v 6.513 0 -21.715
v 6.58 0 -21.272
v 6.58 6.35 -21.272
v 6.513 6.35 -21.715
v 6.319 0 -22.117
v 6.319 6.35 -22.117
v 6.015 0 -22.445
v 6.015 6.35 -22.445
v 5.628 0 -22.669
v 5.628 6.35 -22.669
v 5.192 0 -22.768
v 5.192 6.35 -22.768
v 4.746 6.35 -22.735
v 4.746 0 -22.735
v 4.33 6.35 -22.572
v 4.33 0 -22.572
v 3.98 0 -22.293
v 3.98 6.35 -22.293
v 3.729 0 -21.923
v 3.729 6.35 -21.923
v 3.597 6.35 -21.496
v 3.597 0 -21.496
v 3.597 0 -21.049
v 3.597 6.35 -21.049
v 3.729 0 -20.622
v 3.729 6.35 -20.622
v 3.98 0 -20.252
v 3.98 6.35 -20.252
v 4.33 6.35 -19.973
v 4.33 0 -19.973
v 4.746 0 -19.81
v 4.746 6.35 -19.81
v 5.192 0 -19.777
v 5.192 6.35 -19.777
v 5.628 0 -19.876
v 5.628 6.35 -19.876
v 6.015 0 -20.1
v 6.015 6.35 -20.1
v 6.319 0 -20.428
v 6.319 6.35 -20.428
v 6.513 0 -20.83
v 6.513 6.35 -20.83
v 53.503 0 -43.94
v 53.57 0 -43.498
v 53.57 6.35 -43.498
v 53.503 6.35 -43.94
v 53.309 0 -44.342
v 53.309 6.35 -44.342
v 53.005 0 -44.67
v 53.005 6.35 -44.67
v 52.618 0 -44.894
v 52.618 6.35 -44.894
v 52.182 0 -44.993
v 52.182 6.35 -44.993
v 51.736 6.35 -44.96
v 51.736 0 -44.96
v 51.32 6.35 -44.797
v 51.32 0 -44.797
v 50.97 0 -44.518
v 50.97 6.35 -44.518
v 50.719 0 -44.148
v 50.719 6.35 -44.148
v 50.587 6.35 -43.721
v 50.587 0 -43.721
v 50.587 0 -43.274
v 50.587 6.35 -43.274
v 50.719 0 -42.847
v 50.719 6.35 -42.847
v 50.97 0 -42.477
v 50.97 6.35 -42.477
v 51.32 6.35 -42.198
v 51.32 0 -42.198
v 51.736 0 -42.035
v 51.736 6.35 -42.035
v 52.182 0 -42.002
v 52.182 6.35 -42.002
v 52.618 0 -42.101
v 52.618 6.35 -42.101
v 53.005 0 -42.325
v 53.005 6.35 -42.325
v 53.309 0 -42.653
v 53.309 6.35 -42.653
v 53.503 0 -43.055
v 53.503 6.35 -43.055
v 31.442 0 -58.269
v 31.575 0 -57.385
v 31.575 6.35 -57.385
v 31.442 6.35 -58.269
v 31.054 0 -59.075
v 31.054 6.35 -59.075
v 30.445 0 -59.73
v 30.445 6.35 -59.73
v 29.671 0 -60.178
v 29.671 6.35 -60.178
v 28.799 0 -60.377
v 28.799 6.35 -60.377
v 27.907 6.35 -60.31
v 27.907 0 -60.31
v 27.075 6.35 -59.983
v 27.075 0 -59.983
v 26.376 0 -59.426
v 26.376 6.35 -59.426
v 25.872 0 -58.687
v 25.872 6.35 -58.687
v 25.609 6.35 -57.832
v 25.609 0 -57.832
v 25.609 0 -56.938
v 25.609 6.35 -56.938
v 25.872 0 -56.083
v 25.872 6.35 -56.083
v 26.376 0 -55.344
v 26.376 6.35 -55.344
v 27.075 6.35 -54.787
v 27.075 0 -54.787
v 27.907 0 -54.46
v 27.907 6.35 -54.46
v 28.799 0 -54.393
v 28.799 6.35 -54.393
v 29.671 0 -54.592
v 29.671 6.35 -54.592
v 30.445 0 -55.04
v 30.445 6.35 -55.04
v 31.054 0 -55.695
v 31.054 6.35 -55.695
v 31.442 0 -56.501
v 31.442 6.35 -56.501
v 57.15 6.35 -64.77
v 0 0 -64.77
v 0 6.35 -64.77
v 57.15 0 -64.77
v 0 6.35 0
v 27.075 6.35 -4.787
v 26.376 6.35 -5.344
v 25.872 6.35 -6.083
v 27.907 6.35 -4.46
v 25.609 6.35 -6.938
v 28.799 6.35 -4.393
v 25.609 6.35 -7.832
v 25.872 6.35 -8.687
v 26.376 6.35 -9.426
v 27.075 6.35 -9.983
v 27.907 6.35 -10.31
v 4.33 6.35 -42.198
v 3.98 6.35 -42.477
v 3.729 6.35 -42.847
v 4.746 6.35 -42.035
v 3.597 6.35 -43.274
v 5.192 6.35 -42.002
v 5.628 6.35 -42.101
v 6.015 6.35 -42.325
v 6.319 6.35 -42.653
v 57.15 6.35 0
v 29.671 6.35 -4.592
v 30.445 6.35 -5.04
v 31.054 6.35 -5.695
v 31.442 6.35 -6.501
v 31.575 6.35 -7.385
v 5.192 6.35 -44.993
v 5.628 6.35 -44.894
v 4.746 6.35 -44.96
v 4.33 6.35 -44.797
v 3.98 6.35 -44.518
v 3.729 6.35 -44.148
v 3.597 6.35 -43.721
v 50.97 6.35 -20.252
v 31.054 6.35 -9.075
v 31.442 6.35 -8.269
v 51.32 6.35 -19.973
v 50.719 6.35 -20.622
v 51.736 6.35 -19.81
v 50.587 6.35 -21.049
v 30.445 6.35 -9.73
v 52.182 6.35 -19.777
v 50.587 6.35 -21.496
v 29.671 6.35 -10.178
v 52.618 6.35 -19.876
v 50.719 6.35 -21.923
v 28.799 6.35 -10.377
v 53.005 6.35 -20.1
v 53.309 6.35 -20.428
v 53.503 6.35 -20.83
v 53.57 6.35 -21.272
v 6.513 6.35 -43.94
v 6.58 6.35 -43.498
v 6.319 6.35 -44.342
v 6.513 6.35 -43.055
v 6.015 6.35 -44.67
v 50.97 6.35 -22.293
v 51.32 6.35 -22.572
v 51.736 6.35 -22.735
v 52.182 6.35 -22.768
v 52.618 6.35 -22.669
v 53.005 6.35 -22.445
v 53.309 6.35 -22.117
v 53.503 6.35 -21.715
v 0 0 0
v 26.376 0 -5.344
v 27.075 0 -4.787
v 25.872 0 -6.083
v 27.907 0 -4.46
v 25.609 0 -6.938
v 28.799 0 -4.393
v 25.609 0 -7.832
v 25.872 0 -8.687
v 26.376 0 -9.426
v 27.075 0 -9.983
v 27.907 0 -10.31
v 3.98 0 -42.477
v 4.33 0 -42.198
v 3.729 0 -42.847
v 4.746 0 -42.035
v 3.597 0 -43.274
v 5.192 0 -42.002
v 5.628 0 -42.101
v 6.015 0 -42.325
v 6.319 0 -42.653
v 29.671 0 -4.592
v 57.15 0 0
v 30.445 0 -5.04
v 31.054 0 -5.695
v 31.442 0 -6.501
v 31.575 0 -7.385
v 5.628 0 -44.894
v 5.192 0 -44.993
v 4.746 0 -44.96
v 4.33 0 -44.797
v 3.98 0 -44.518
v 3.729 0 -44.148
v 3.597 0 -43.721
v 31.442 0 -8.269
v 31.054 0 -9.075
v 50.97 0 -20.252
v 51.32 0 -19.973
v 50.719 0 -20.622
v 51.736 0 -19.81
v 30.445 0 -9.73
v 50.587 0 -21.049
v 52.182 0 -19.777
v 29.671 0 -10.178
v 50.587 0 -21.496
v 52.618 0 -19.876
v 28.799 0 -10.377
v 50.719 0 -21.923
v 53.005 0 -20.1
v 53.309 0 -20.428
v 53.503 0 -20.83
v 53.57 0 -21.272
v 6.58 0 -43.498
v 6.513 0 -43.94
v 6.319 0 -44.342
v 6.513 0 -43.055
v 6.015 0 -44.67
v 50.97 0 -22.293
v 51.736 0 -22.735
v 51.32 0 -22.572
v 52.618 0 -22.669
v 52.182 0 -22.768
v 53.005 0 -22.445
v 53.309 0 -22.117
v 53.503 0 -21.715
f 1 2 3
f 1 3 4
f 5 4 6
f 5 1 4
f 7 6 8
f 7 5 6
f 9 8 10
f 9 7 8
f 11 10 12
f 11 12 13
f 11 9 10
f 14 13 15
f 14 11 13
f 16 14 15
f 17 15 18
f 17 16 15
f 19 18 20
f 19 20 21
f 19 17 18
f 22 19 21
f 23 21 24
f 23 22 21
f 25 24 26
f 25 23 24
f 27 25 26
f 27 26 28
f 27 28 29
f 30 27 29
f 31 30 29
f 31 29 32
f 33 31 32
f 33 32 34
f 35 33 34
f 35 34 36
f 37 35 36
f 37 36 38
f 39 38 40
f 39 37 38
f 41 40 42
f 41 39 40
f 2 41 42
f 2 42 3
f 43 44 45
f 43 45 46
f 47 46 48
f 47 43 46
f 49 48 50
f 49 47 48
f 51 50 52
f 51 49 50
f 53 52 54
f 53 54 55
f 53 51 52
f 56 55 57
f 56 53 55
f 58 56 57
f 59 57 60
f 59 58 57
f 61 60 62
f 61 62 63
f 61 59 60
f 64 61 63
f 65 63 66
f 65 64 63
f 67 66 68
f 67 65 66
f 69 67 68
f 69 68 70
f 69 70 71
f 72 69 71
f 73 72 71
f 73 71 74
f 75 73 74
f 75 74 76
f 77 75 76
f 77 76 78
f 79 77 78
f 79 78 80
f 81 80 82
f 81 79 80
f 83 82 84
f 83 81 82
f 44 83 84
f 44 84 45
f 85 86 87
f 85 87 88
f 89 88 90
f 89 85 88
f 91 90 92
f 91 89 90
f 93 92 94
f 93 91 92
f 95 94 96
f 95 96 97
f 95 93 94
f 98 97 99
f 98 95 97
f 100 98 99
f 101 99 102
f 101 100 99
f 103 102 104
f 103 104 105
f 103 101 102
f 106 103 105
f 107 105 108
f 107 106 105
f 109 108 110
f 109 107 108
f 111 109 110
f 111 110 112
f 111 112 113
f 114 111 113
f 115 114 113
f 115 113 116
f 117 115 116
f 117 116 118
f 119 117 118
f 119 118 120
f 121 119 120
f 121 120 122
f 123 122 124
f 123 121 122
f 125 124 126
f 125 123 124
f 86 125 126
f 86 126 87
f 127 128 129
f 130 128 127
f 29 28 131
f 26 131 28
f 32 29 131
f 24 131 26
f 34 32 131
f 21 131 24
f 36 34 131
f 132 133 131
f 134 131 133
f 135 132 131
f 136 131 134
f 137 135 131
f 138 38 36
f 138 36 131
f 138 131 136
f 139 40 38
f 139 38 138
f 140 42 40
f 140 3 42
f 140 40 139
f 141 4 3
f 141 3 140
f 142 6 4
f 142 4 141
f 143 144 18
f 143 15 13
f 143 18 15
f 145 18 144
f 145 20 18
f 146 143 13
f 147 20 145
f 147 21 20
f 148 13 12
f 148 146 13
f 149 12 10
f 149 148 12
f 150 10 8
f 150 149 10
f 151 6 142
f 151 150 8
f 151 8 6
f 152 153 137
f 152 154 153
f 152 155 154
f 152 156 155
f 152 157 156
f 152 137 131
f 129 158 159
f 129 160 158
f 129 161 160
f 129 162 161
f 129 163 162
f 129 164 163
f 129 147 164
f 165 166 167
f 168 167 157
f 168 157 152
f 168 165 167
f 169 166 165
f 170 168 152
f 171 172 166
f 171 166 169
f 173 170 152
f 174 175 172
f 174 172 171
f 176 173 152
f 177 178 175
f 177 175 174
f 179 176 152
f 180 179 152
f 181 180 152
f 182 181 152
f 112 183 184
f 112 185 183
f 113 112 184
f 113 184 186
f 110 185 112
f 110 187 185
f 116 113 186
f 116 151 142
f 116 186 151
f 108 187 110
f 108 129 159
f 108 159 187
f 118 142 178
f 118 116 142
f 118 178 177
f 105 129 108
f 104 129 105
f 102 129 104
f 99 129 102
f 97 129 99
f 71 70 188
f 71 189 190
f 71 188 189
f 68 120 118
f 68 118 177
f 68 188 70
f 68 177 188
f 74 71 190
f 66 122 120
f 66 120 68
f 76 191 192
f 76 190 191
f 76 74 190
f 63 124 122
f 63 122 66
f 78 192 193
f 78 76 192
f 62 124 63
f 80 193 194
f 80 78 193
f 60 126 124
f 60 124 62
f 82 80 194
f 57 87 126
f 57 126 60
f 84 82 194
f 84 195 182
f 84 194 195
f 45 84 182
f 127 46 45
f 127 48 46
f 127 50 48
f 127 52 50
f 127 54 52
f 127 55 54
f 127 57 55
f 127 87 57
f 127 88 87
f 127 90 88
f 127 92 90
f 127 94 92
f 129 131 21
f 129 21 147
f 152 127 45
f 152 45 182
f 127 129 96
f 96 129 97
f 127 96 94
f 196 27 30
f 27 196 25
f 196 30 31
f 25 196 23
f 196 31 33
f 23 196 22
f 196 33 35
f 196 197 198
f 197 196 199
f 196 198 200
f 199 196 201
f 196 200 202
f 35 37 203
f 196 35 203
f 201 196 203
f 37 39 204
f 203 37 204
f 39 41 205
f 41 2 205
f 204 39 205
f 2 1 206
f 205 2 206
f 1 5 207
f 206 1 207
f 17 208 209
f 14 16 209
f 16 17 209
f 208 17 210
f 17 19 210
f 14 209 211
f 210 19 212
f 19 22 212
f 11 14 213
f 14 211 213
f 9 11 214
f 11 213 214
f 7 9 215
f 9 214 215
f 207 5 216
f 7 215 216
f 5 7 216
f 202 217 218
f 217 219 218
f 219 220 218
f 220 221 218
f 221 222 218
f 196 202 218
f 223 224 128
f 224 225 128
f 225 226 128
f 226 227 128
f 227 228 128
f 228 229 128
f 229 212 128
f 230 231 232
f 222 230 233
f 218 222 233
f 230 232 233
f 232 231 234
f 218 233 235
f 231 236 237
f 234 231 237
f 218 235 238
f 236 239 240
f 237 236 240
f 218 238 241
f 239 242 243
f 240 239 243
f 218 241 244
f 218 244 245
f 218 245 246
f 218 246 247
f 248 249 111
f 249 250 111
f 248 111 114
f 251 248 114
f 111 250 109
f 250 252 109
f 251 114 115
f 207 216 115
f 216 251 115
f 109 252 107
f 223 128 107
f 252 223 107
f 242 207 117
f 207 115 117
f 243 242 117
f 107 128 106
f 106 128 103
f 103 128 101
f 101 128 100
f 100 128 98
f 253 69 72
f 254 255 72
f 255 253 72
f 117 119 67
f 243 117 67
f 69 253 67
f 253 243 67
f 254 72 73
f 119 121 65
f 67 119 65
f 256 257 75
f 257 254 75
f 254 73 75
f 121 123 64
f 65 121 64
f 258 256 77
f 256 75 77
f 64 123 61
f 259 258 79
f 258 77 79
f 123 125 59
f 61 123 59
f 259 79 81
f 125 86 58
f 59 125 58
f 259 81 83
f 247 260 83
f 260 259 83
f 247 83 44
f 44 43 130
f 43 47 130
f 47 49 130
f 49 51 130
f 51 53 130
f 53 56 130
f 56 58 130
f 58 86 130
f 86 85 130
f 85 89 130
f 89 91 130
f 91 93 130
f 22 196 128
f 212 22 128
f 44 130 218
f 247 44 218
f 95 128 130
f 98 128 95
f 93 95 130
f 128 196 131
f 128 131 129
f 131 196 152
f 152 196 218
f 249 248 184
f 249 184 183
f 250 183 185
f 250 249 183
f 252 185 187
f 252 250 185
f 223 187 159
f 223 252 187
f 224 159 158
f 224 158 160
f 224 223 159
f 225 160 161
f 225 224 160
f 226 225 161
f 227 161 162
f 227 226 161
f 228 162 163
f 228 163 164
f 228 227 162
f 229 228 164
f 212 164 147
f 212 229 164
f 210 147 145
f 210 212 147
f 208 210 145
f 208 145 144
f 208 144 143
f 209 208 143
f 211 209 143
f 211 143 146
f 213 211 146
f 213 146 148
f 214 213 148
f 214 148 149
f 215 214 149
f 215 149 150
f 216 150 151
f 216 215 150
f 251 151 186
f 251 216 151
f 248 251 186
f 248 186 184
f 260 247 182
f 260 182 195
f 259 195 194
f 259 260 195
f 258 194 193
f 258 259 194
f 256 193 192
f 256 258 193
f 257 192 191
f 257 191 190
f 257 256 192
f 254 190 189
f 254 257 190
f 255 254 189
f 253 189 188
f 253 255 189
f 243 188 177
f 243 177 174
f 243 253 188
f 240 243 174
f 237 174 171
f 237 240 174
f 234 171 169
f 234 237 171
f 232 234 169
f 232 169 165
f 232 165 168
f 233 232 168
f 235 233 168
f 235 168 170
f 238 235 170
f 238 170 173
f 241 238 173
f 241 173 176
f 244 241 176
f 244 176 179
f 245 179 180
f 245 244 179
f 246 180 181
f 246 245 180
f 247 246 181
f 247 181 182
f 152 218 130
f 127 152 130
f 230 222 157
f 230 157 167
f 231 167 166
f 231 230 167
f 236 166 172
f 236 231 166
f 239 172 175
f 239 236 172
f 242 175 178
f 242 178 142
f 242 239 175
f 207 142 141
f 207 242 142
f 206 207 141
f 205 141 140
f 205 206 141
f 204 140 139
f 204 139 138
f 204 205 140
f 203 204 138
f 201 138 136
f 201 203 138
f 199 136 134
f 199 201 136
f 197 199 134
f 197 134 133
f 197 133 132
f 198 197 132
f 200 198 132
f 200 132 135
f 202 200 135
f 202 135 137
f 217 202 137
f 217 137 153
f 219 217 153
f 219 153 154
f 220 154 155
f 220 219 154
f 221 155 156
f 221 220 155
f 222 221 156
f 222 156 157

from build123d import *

# Parameters (mm, degrees)
SKETCH1_W           = 57.15
SKETCH1_H           = 64.77
SKETCH1_R           = 1.5
SKETCH1_R_2         = 3
BOSS_EXTRUDE1_DEPTH = 6.35


with BuildPart() as part:
    # Sketch1 → Boss-Extrude1 (new body)
    with BuildSketch(Plane(origin=(0, 0, 0), x_dir=(1, 0, 0), z_dir=(0, 1, 0))):
        with Locations((28.575, 32.385)):
            Rectangle(SKETCH1_W, SKETCH1_H)
        with Locations((5.08, 21.2725)):
            Circle(SKETCH1_R, mode=Mode.SUBTRACT)
        with Locations((5.08, 43.4975)):
            Circle(SKETCH1_R, mode=Mode.SUBTRACT)
        with Locations((52.07, 21.2725)):
            Circle(SKETCH1_R, mode=Mode.SUBTRACT)
        with Locations((52.07, 43.4975)):
            Circle(SKETCH1_R, mode=Mode.SUBTRACT)
        with Locations((28.575, 7.385)):
            Circle(SKETCH1_R_2, mode=Mode.SUBTRACT)
        with Locations((28.575, 57.385)):
            Circle(SKETCH1_R_2, mode=Mode.SUBTRACT)
    extrude(amount=BOSS_EXTRUDE1_DEPTH)


solid = part.part
